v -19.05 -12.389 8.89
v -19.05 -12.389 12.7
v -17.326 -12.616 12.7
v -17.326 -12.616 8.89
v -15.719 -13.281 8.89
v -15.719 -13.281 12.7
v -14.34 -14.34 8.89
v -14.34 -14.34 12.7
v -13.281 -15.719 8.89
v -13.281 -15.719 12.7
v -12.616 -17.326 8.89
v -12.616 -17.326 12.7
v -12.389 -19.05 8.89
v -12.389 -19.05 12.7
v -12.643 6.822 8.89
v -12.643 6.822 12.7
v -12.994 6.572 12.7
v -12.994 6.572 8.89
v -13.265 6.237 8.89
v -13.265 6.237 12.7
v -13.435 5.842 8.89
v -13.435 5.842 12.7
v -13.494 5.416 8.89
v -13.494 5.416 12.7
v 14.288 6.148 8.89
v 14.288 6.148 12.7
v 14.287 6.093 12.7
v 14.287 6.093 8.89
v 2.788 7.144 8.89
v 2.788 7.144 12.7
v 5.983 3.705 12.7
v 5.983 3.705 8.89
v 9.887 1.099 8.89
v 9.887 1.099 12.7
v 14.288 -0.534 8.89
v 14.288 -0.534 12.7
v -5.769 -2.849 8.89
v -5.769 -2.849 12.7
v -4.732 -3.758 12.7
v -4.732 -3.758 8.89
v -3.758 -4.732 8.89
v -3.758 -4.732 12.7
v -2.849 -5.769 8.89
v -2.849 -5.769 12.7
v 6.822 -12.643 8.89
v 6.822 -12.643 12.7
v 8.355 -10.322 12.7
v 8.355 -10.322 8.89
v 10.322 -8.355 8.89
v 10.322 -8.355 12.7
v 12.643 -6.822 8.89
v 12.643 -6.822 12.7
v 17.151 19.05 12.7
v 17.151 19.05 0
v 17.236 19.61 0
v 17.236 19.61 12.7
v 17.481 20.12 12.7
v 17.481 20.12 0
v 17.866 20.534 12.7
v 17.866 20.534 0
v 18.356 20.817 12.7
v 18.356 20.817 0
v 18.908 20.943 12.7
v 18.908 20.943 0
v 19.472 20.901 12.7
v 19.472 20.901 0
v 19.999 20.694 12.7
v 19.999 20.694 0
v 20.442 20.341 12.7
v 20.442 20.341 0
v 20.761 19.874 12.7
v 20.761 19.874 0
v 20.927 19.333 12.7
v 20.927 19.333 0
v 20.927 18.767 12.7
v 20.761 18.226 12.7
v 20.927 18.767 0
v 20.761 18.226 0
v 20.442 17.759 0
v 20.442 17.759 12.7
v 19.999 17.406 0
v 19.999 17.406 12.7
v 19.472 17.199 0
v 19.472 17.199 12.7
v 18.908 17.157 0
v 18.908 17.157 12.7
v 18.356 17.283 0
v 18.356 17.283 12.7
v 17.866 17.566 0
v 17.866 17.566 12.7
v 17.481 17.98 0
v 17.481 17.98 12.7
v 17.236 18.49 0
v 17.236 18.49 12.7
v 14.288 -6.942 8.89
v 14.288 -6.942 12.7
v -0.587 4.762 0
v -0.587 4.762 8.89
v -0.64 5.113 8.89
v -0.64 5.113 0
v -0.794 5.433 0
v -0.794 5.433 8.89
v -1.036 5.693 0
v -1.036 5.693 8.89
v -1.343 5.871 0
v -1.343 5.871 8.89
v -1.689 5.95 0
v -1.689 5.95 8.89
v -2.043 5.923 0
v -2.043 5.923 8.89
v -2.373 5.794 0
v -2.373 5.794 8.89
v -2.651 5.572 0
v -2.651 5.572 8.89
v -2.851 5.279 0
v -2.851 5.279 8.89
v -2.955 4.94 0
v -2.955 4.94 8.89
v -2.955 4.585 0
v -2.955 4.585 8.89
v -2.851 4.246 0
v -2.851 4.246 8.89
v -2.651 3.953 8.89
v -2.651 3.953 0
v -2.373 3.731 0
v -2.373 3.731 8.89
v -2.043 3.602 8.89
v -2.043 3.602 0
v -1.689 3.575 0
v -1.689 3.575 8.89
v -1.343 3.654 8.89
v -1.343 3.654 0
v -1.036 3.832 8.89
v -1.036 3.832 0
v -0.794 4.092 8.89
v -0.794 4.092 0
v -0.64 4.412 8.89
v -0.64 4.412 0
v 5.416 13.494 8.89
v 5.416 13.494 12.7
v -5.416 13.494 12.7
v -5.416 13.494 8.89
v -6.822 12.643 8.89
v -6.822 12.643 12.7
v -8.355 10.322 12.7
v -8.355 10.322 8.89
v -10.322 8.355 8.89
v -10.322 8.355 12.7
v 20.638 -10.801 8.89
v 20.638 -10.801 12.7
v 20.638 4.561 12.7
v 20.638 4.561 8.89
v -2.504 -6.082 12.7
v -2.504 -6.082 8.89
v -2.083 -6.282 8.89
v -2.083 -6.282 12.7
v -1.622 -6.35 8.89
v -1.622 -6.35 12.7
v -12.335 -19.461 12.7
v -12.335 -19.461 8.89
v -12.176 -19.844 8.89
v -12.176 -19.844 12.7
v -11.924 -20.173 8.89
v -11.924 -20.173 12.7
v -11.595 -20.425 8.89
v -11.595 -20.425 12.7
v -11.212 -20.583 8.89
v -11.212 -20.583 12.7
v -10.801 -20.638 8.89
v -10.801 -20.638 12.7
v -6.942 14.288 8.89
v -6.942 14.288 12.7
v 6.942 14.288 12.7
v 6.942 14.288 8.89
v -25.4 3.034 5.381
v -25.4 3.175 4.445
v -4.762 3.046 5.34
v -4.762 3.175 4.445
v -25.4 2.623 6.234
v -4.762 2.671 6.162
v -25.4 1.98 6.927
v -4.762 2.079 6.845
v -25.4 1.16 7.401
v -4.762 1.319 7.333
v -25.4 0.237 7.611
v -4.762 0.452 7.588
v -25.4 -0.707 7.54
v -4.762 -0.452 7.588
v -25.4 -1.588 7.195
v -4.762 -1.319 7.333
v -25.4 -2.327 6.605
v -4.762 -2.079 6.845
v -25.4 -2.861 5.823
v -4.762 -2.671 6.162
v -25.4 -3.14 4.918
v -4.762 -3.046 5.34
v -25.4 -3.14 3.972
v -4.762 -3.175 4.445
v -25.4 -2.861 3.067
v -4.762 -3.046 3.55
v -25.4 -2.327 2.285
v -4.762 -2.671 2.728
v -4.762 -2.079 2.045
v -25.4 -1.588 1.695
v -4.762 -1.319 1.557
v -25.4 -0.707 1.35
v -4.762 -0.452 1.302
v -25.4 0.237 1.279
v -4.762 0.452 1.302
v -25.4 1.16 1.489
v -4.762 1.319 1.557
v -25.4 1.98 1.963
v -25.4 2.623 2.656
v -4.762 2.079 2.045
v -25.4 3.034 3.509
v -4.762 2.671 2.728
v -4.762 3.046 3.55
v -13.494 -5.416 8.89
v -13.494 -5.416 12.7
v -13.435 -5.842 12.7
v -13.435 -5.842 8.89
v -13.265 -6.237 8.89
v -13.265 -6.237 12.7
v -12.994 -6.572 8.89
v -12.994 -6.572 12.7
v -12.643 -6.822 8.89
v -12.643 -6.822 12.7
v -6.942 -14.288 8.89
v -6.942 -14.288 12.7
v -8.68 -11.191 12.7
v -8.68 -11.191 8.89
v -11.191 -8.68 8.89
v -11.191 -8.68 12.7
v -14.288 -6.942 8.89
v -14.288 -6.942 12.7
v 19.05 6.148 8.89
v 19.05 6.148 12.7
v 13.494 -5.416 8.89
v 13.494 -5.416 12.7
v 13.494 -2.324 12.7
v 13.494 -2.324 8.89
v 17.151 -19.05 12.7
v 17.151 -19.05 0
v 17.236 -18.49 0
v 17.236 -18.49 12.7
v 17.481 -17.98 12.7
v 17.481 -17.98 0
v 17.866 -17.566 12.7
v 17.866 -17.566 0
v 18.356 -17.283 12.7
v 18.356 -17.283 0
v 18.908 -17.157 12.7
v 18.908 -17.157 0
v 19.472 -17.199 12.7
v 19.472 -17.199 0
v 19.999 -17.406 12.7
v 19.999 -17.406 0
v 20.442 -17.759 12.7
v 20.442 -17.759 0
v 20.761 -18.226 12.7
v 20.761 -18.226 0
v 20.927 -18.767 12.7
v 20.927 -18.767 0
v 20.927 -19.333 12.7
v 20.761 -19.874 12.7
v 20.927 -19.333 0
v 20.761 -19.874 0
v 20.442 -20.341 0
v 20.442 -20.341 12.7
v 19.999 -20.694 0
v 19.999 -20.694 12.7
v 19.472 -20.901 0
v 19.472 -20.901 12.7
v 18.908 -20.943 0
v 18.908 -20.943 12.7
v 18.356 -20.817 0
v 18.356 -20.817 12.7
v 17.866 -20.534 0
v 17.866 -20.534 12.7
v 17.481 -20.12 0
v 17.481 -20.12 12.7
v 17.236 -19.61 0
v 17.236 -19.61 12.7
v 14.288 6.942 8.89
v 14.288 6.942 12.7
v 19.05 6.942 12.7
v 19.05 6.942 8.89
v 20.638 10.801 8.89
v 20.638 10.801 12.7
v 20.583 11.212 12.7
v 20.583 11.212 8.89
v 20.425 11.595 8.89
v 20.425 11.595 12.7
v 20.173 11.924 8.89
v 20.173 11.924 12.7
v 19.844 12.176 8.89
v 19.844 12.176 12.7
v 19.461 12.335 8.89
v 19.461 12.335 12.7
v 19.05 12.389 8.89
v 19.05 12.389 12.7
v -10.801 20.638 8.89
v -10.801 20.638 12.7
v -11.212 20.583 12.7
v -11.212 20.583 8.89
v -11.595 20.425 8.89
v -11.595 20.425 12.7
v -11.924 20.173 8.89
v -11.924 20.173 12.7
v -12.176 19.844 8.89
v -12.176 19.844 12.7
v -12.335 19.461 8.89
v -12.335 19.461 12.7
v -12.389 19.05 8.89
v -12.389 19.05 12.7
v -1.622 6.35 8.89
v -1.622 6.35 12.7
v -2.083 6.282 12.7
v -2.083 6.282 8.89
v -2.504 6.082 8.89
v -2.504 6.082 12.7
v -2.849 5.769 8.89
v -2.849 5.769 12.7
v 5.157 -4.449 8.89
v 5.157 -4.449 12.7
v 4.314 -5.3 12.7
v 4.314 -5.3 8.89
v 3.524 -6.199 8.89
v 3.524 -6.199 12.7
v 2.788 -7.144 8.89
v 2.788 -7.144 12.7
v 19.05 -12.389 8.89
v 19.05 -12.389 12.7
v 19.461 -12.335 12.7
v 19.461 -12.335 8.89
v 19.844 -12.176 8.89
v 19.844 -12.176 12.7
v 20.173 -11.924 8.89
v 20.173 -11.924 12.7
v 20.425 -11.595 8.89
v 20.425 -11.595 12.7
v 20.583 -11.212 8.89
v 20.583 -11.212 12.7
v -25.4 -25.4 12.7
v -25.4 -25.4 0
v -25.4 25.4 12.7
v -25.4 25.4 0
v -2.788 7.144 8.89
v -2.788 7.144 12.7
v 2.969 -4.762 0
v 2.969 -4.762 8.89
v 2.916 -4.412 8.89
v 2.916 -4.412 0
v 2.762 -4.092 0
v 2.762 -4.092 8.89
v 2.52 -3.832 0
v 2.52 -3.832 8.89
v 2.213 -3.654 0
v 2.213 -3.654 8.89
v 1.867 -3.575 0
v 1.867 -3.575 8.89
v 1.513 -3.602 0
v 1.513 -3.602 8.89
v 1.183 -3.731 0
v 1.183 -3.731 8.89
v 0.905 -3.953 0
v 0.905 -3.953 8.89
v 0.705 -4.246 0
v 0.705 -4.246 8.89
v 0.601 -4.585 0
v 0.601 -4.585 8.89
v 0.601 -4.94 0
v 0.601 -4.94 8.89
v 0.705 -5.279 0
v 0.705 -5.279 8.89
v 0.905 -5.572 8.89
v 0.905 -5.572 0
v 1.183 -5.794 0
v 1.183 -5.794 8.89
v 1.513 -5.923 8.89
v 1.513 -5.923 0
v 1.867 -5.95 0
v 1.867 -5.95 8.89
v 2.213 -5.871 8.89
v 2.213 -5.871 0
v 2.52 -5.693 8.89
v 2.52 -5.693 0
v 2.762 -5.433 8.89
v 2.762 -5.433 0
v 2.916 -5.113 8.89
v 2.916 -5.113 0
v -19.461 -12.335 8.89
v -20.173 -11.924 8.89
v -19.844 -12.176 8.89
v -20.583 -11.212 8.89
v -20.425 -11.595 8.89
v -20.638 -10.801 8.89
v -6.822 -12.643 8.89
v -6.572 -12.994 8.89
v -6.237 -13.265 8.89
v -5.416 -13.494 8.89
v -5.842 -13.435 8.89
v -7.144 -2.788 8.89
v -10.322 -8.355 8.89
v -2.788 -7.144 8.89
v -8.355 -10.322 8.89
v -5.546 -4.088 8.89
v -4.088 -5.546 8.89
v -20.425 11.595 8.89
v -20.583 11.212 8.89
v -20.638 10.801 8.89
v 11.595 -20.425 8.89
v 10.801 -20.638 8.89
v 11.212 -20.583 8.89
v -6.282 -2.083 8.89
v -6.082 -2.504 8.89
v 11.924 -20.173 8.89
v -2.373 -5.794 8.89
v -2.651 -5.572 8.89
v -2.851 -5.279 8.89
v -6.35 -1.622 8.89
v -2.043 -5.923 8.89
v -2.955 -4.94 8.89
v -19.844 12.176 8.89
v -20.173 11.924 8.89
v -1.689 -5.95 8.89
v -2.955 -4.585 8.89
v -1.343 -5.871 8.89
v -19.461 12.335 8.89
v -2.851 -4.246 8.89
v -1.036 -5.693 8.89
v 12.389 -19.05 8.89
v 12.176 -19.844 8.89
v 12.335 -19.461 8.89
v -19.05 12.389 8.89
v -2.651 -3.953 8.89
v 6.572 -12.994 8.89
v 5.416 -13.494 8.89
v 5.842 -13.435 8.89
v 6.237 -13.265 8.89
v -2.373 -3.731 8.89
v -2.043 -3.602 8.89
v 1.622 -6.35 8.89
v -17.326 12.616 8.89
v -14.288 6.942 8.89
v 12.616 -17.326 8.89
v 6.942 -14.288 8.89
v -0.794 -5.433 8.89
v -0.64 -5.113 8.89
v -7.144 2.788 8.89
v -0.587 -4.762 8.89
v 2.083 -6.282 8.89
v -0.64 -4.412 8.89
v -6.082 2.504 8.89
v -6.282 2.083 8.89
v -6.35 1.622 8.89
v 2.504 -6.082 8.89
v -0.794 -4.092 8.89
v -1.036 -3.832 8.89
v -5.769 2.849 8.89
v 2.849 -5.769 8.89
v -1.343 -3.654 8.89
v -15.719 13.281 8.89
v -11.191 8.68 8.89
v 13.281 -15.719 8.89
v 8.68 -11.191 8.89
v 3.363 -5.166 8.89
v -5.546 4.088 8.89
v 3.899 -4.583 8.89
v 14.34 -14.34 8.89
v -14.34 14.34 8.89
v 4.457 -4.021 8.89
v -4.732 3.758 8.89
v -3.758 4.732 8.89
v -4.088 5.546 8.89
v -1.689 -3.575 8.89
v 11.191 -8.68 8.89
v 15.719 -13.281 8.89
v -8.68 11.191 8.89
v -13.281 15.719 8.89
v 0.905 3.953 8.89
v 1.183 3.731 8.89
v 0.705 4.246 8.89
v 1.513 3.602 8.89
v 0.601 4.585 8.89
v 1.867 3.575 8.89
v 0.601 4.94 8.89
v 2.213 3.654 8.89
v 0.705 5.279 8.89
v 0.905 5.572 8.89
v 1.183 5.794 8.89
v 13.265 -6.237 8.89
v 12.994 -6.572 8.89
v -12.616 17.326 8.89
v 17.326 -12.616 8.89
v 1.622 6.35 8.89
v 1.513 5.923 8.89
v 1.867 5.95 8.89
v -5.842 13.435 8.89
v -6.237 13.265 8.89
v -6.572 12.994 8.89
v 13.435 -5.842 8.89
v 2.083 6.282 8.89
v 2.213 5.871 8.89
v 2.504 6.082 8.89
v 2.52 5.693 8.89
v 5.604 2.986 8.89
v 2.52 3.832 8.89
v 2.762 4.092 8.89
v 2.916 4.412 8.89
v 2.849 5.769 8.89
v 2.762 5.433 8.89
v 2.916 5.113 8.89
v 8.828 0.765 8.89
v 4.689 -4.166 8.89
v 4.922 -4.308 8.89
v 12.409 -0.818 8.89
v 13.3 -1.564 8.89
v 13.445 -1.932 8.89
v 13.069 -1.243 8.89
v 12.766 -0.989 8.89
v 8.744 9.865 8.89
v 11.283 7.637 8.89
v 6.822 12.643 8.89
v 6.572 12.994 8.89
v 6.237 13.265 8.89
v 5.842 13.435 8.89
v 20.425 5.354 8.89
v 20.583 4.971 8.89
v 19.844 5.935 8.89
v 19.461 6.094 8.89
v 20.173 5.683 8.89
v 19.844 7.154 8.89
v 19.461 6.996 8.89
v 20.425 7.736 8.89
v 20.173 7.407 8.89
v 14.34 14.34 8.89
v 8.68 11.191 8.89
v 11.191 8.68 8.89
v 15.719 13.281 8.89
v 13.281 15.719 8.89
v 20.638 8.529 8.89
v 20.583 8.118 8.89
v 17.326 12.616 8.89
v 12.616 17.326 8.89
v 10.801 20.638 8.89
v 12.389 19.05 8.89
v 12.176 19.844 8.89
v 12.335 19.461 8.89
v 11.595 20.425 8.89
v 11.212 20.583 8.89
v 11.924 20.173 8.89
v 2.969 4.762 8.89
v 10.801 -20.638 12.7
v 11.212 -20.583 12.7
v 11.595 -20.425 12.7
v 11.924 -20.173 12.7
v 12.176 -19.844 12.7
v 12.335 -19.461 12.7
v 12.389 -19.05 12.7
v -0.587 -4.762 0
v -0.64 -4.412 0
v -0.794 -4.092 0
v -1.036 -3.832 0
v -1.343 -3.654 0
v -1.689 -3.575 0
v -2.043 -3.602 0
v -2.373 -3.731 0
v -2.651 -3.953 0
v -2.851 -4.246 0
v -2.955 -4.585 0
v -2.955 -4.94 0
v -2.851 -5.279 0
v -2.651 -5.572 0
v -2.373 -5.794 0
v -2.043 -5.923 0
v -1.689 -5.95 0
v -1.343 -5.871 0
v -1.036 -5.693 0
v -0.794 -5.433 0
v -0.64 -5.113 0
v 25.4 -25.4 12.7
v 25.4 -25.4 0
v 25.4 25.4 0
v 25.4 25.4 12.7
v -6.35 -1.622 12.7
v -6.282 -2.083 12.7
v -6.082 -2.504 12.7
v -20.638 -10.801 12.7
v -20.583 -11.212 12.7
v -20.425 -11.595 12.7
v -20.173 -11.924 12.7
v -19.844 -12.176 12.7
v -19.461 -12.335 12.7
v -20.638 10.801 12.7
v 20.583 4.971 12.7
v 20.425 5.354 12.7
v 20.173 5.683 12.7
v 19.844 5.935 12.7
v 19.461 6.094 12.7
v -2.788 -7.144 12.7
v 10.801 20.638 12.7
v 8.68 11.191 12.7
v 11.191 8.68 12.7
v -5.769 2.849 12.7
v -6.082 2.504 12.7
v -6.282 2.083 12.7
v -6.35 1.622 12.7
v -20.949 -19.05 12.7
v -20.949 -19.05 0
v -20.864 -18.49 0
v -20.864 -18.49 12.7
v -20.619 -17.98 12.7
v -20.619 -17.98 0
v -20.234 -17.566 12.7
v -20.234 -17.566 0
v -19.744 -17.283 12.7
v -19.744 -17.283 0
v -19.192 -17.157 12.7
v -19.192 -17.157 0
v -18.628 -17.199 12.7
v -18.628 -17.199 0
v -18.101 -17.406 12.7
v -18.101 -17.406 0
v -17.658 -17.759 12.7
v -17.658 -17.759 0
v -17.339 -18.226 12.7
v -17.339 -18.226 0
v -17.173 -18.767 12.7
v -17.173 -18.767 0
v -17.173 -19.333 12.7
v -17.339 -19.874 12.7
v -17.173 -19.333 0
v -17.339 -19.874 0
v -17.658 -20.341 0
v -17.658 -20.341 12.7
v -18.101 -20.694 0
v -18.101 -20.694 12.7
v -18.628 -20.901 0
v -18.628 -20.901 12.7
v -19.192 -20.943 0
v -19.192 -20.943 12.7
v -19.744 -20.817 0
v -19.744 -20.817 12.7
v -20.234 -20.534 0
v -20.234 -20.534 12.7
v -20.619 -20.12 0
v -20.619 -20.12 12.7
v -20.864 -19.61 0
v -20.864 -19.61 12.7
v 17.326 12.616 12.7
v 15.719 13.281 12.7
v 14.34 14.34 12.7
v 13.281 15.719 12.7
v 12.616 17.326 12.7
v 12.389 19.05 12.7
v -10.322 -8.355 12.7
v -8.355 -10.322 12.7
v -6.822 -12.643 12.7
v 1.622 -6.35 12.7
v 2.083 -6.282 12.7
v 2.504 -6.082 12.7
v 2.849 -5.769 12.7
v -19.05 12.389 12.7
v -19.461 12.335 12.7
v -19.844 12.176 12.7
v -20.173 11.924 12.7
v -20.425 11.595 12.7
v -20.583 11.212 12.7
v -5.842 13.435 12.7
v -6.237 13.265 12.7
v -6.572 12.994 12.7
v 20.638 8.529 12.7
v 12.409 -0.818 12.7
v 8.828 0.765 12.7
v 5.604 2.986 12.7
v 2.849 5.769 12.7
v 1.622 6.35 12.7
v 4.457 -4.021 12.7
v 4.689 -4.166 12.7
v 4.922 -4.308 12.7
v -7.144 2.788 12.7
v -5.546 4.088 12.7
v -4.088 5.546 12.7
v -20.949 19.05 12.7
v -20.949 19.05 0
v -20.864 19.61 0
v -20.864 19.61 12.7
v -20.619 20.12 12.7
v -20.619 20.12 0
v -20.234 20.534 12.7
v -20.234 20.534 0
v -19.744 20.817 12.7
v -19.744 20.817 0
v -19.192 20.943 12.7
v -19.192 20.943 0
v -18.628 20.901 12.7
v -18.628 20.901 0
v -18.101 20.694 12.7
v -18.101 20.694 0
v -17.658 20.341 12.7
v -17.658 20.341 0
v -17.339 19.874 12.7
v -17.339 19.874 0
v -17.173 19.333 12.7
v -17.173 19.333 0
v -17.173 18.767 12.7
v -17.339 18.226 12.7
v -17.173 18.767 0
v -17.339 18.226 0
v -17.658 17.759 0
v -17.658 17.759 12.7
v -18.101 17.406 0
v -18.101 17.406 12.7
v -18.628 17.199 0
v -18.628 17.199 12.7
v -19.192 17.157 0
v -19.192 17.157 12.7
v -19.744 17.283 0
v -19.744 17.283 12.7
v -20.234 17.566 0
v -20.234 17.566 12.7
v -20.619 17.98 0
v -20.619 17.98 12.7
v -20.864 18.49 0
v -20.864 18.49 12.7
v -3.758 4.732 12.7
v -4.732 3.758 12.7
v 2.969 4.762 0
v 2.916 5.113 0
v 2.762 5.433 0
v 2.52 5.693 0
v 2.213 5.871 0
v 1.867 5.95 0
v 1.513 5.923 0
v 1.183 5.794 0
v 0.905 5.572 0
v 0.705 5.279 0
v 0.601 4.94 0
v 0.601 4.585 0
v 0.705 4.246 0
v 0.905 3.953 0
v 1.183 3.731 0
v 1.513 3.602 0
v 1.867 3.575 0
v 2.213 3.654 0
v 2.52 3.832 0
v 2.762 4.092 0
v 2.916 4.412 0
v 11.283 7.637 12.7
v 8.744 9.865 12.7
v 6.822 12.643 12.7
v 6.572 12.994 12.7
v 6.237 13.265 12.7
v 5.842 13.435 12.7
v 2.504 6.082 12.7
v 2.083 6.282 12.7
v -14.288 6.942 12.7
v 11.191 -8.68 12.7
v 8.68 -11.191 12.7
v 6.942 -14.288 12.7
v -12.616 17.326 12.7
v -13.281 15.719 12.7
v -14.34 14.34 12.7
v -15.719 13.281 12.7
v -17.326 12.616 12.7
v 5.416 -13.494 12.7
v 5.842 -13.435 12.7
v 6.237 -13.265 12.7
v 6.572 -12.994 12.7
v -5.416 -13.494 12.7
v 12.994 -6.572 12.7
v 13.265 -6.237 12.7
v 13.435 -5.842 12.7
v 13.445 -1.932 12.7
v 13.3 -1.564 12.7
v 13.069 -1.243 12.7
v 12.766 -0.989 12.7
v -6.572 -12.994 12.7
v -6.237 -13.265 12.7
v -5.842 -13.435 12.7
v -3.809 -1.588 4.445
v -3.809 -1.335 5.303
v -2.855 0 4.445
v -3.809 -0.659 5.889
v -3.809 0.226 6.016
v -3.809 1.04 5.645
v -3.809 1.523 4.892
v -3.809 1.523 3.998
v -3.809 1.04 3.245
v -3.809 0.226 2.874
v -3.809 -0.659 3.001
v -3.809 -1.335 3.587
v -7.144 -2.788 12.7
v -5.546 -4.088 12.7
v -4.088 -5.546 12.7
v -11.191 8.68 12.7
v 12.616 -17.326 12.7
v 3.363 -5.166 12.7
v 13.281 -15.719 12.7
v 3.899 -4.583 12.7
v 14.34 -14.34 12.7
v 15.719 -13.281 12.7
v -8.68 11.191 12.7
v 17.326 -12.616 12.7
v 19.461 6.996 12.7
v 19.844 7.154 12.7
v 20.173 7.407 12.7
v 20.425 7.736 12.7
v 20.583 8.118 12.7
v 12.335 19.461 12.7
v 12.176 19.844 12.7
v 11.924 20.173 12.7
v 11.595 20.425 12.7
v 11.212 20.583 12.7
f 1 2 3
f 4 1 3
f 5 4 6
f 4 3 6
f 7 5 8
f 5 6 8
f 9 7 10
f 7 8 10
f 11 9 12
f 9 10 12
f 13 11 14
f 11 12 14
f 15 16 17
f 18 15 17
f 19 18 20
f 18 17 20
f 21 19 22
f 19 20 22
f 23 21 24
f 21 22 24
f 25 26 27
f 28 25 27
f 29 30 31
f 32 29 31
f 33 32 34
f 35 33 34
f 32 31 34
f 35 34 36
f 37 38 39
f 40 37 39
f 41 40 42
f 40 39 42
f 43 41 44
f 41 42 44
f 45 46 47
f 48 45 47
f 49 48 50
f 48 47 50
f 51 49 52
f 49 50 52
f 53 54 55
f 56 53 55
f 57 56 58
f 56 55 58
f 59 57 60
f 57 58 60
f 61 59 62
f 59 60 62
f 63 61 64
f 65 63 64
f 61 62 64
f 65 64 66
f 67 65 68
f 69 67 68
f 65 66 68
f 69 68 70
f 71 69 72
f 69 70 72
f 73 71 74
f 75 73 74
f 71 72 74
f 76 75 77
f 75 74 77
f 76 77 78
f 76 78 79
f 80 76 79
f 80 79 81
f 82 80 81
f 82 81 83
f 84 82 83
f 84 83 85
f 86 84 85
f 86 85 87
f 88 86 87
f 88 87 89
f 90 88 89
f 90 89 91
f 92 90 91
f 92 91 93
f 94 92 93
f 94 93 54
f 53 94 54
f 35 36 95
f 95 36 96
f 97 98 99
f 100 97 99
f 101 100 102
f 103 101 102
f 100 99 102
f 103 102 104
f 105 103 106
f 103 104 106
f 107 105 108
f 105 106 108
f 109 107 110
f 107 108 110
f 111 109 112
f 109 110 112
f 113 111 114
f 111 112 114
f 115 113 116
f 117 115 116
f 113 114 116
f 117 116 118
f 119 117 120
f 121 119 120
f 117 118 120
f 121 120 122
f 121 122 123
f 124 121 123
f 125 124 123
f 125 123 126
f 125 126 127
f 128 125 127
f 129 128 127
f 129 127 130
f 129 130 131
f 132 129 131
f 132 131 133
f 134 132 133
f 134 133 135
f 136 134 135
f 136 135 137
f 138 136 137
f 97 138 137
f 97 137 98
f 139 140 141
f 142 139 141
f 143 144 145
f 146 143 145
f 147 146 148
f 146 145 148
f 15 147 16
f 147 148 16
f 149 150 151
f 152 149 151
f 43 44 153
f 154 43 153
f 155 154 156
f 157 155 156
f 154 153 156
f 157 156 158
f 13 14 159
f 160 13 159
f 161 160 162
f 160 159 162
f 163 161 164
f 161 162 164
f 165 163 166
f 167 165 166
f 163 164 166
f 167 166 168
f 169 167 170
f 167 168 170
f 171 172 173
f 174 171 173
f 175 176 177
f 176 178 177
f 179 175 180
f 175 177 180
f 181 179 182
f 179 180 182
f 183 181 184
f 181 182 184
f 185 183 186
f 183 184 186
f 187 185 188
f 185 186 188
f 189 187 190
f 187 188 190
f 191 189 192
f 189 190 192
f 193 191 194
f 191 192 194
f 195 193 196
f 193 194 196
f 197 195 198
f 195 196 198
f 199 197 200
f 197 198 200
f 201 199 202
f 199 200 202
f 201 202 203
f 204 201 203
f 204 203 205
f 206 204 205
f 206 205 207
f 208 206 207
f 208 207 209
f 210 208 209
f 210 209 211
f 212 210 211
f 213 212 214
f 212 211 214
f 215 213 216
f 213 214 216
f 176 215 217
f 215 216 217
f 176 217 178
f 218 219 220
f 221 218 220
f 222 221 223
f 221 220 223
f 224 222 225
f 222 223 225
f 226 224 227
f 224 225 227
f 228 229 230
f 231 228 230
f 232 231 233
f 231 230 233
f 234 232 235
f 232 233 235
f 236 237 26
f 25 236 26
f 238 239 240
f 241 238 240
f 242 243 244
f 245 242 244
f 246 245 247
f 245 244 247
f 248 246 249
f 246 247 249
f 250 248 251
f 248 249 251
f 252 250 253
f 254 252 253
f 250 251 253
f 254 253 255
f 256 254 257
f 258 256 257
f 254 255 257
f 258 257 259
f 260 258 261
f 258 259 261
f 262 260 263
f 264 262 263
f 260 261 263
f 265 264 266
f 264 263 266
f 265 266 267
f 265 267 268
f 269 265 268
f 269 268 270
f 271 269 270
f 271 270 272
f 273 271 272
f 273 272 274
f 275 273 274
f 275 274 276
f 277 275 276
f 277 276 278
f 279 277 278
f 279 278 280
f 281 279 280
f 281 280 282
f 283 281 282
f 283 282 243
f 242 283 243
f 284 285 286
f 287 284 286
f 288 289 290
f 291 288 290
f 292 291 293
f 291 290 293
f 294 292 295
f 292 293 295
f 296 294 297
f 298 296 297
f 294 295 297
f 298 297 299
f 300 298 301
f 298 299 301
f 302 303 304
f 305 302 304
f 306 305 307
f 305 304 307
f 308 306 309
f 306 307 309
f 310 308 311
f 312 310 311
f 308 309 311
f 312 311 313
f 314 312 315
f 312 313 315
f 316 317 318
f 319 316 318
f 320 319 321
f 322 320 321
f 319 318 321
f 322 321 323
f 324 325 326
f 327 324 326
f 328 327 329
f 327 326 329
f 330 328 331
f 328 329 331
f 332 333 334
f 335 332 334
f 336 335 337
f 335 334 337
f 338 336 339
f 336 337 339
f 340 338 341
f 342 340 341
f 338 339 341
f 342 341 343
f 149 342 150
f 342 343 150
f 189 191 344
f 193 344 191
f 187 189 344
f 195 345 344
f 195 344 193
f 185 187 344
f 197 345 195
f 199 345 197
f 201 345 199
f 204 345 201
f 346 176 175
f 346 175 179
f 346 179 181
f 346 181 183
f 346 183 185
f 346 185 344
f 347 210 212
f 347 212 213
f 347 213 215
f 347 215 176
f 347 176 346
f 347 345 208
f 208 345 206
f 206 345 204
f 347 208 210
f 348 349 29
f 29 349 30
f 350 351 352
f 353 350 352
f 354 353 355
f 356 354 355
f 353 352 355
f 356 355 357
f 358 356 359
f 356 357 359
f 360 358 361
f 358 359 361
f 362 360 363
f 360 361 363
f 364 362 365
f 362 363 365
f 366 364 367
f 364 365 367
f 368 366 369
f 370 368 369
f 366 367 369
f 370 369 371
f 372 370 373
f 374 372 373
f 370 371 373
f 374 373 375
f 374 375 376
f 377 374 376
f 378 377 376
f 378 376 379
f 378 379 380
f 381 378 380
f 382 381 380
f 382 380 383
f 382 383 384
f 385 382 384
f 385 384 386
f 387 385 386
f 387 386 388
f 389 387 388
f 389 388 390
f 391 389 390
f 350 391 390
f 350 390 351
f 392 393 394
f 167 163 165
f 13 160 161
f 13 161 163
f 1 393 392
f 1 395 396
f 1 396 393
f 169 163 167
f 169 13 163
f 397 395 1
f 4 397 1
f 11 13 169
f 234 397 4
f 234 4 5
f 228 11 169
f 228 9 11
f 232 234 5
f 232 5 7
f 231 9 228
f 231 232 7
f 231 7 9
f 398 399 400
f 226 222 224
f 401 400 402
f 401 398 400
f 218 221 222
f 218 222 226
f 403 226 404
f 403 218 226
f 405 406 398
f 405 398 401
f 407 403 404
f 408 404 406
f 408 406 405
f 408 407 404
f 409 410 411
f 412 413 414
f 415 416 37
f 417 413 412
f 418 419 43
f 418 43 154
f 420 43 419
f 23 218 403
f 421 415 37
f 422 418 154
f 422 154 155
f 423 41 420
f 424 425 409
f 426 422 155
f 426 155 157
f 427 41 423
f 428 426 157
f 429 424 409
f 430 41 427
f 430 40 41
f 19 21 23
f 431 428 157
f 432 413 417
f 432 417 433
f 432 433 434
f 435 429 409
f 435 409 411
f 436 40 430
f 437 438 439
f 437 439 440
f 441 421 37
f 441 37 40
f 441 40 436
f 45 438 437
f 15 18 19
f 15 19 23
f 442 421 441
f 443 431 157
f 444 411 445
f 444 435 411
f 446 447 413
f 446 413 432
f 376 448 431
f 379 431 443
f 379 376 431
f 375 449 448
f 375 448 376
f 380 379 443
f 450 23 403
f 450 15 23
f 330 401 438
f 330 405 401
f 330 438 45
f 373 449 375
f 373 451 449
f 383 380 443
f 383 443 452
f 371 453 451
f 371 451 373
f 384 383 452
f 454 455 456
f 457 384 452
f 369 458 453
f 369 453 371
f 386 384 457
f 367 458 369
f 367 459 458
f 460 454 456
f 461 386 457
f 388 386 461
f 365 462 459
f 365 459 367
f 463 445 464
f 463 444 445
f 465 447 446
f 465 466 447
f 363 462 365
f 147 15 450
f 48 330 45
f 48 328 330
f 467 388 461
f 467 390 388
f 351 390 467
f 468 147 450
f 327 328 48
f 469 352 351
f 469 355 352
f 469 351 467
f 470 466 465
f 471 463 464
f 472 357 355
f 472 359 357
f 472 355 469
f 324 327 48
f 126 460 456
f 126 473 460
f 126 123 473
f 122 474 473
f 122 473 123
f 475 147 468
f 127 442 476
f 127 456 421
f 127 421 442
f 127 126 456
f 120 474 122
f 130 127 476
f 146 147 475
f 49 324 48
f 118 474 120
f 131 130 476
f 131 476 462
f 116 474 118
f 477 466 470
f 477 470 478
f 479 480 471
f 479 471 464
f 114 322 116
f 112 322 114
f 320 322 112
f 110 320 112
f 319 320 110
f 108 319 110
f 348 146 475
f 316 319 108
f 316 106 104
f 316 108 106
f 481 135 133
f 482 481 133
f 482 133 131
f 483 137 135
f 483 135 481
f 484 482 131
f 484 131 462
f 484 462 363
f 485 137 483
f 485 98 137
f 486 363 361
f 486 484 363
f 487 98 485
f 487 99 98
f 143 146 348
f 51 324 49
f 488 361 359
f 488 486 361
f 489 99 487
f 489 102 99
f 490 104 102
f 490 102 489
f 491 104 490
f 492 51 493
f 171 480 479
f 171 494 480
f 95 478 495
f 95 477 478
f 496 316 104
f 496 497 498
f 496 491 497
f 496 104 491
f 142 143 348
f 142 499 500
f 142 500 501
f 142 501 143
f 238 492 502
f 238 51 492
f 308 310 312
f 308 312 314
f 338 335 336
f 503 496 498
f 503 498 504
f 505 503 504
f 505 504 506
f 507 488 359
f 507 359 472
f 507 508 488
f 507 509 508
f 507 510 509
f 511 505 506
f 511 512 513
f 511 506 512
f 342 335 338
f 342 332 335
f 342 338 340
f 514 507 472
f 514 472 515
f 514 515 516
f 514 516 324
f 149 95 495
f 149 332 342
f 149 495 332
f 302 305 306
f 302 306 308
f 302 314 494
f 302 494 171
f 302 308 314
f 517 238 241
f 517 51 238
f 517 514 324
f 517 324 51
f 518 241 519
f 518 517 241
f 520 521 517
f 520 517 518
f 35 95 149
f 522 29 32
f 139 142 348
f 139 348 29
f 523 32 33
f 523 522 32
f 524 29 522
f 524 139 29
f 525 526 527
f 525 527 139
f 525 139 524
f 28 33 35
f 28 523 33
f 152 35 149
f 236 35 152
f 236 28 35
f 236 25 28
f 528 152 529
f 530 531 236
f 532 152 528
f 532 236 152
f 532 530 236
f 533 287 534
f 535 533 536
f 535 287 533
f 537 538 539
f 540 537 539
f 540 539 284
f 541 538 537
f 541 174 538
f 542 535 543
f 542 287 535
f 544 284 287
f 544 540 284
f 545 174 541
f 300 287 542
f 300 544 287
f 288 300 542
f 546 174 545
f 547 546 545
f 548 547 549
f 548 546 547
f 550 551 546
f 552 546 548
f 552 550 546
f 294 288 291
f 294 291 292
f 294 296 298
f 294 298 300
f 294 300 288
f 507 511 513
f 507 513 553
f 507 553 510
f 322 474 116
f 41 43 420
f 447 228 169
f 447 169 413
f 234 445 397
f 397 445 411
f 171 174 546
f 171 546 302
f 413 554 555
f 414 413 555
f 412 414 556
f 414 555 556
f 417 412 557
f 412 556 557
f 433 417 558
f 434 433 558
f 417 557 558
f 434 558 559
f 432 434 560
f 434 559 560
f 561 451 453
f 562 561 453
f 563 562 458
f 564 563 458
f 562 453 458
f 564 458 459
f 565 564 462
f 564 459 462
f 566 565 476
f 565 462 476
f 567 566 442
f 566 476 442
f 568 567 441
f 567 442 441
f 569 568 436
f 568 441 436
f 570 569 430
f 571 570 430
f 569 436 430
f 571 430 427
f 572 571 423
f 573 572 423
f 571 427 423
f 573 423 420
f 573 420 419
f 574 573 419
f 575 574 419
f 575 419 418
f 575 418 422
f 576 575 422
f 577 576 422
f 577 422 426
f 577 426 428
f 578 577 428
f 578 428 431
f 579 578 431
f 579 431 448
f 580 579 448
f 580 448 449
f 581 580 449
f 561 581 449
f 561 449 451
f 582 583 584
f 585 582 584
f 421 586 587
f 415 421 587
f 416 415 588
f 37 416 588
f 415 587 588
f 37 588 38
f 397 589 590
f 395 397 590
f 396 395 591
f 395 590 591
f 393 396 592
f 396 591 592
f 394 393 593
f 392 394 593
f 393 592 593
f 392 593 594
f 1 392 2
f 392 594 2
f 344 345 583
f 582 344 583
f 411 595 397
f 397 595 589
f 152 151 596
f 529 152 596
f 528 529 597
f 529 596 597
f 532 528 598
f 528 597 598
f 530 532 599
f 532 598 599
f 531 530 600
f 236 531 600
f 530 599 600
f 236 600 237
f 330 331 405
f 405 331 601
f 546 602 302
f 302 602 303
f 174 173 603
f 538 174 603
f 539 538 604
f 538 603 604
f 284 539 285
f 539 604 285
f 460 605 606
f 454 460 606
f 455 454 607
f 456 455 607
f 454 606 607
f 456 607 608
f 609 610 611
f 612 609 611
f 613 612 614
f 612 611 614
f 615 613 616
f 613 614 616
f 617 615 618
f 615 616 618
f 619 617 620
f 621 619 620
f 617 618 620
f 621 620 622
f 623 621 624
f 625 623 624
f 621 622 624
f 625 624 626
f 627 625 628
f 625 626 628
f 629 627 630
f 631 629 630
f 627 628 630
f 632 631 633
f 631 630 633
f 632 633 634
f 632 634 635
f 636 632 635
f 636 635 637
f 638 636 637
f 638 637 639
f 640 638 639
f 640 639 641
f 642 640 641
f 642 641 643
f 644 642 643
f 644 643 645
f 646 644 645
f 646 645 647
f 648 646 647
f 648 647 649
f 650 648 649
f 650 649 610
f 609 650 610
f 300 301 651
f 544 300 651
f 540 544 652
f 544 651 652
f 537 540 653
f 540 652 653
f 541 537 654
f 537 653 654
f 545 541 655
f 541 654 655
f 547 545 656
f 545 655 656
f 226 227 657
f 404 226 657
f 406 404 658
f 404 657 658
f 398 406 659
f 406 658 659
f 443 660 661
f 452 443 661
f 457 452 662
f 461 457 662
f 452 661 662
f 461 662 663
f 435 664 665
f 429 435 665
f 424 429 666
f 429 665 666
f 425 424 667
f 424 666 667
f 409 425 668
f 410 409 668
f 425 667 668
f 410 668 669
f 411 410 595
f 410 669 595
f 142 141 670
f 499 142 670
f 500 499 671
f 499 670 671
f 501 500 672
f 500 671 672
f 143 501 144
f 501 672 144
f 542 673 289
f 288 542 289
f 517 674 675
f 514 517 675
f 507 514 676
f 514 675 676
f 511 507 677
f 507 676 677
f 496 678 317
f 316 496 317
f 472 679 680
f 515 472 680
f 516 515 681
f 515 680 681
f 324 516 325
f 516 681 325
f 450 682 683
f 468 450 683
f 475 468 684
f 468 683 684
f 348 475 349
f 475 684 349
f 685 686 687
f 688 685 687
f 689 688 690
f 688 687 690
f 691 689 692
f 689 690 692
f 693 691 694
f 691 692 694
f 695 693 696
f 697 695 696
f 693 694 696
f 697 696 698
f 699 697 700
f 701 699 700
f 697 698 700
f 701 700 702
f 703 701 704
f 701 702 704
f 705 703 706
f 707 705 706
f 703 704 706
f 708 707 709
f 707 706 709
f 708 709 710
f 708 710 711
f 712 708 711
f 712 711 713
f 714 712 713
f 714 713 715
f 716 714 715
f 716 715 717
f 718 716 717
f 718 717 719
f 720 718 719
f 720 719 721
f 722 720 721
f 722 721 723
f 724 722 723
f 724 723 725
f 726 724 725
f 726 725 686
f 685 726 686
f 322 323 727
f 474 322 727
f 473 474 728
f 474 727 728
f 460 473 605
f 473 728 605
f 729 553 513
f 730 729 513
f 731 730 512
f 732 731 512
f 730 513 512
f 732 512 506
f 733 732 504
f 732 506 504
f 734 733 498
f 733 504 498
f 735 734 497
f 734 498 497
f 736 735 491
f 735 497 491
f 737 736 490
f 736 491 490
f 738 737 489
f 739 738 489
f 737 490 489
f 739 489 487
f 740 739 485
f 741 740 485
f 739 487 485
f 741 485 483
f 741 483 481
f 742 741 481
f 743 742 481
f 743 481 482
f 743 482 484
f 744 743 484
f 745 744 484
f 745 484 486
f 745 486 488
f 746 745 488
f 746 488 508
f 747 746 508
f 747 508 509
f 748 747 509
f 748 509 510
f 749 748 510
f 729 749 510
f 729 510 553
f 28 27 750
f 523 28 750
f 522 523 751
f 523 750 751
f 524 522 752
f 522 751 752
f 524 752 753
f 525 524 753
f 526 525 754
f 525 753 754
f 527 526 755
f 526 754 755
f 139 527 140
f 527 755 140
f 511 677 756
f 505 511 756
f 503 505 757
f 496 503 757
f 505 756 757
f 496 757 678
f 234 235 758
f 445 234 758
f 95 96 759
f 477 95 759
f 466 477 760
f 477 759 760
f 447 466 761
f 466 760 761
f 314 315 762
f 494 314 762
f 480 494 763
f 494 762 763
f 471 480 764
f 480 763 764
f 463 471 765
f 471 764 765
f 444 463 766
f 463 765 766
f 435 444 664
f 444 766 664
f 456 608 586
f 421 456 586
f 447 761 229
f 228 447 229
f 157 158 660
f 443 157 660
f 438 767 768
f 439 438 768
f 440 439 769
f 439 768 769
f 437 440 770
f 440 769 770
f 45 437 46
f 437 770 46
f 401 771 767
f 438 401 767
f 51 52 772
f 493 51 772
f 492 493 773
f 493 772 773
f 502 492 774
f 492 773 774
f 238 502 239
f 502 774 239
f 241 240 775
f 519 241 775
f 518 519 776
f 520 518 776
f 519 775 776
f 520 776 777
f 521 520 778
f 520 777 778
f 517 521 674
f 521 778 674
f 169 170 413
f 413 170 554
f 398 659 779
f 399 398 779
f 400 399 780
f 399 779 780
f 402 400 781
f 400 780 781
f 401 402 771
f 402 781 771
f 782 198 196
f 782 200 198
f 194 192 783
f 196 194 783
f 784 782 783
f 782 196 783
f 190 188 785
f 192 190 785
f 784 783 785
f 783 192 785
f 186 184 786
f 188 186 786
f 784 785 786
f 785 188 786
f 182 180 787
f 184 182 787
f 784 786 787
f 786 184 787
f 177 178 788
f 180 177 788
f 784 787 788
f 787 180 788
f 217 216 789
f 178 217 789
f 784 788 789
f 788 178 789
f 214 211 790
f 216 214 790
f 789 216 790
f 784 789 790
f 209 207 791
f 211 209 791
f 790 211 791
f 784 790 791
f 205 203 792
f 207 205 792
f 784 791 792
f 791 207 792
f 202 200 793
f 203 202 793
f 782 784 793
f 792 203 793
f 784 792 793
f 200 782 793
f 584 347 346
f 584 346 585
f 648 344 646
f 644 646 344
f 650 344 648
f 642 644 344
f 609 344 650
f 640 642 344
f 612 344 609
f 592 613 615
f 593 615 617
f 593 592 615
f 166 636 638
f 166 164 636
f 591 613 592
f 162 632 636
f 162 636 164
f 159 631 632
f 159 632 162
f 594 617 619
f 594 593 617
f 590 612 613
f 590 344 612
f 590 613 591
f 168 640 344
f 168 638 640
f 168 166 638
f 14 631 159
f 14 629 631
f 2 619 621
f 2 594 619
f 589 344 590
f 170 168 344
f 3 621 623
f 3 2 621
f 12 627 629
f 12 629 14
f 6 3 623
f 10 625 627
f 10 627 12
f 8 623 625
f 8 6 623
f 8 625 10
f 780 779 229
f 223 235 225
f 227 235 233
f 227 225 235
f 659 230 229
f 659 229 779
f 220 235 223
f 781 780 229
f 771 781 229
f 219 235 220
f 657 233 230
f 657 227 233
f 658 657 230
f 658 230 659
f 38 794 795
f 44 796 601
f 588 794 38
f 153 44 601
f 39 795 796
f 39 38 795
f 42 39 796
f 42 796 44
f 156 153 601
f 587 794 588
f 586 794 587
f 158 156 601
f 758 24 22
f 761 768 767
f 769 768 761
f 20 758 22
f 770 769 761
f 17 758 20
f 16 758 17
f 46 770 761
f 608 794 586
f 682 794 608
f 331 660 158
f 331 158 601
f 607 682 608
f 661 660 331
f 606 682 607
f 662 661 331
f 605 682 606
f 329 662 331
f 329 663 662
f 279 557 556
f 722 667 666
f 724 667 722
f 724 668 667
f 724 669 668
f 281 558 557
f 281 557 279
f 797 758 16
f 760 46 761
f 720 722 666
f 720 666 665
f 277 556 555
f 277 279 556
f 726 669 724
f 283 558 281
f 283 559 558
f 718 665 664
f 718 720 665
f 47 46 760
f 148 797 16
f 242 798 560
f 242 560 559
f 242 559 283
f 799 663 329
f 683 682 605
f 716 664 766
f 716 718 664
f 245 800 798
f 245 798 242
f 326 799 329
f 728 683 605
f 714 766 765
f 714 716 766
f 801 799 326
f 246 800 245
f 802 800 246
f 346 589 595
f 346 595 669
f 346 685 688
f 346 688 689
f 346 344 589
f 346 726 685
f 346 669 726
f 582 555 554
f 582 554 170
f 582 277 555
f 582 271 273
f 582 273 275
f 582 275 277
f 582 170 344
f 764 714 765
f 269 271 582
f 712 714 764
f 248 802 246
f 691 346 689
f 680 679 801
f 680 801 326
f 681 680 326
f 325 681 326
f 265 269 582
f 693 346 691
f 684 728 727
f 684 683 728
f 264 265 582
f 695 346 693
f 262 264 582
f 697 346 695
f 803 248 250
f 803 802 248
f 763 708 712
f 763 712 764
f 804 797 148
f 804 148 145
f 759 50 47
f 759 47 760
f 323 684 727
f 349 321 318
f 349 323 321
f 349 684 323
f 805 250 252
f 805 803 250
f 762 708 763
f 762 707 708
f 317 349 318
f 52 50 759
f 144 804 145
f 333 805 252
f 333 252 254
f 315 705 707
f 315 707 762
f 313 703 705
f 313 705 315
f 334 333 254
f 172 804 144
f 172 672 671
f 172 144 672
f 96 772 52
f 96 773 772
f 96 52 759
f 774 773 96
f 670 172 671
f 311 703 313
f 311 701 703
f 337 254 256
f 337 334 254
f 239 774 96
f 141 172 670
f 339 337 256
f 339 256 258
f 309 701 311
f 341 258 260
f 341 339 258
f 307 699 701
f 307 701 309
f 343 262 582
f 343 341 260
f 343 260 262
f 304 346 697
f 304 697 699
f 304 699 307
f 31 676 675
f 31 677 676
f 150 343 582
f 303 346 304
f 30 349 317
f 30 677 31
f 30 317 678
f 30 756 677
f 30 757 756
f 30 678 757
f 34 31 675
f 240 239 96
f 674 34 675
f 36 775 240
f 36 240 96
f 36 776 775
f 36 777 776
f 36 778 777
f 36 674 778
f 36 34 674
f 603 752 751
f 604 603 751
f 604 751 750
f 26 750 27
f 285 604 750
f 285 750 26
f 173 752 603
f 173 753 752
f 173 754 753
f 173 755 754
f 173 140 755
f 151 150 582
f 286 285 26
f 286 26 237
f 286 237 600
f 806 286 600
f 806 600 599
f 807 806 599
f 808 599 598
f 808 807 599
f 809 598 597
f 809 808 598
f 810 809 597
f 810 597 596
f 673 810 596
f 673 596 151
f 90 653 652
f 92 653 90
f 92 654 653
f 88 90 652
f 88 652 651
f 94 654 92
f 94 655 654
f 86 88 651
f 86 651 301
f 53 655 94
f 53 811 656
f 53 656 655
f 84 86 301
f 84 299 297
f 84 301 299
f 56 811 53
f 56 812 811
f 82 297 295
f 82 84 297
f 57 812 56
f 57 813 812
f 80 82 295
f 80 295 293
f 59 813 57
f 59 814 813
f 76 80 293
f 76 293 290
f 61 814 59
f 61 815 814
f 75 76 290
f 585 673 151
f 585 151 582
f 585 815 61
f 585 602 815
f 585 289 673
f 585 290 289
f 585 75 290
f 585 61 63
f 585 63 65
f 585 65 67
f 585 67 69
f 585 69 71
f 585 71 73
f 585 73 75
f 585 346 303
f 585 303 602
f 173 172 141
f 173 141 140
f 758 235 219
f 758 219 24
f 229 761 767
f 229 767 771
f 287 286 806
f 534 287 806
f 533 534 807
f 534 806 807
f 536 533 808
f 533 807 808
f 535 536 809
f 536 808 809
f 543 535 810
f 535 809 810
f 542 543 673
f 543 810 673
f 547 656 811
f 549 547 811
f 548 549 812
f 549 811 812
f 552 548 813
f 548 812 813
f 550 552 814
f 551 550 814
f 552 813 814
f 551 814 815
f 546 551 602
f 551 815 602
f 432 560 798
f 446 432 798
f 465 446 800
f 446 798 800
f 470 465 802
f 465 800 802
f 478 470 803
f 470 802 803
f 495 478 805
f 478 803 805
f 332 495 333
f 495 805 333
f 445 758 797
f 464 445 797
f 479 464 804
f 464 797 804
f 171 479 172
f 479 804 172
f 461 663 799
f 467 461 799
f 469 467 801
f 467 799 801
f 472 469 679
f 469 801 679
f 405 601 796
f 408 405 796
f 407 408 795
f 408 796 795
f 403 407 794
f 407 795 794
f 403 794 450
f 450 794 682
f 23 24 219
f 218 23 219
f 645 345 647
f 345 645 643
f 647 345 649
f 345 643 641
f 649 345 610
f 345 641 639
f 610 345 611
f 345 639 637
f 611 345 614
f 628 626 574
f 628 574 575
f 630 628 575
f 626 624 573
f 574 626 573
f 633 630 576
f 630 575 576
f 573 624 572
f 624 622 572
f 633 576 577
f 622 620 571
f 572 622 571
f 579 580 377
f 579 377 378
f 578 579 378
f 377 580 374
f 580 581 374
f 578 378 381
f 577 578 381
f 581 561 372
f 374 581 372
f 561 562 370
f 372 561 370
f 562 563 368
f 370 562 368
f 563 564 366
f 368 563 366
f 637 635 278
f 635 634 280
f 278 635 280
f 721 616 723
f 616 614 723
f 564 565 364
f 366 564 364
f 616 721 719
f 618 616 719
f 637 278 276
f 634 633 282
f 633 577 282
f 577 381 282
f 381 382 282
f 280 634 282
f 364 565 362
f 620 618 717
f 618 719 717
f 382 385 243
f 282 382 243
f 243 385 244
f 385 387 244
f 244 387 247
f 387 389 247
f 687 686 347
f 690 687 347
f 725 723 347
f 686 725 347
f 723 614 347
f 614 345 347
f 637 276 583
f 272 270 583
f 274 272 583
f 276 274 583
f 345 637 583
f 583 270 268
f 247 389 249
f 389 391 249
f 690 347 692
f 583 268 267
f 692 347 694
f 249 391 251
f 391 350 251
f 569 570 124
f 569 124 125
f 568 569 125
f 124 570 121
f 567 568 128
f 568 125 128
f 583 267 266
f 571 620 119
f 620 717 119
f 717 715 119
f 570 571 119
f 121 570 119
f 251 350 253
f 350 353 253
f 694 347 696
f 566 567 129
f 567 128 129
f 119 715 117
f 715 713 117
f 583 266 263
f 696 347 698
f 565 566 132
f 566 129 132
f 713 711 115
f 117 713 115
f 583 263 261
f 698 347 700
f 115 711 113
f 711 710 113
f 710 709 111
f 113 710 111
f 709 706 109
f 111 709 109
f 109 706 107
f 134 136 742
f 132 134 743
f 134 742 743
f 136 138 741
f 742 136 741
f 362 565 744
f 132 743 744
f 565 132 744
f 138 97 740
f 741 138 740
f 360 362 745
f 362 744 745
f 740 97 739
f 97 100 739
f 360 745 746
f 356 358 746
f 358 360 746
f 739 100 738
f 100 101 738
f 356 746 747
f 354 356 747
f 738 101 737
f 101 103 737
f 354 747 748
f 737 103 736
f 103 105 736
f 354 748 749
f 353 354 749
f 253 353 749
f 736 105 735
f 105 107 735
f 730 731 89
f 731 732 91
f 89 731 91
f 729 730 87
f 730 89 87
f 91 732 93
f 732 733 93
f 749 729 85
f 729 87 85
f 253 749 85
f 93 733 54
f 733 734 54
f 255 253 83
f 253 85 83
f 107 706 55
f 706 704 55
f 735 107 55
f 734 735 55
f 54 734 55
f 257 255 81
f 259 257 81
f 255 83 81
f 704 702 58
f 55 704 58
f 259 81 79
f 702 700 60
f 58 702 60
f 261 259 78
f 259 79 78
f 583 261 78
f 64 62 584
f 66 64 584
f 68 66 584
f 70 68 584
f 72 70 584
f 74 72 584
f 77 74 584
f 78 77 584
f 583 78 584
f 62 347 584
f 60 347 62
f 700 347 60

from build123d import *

# Parameters (mm, degrees)
F0_W      = 50.8
F0_H      = 50.8
F1_DEPTH  = 12.7
F5_D      = 6.35
F5_DEPTH  = 20.6375
F5_TIP    = 1.9077324654
F7_D      = 3.7973
F8_R      = 1.190625
F9_DEPTH  = 3.81
F10_R     = 1.190625
F11_DEPTH = 12.701


with BuildPart() as f1:
    # F0 (on Top) → F1 (new body)
    with BuildSketch(Plane.XY):
        Rectangle(F0_W, F0_H)
    extrude(amount=F1_DEPTH)

    # F5
    with Locations(Plane(origin=(-25.4, 0, 0), x_dir=(0, -1, 0), z_dir=(-1, 0, 0))):
        with Locations((0, 4.445)):
            Hole(F5_D / 2, depth=F5_DEPTH)
            with Locations((0, 0, -(F5_DEPTH + F5_TIP / 2))):  # 118° drill point
                Cone(0, F5_D / 2, F5_TIP, mode=Mode.SUBTRACT)

    # F7 (through all)
    with Locations(Plane.XY.offset(12.7)):
        with Locations((-19.05, 19.05), (19.05, 19.05), (19.05, -19.05), (-19.05, -19.05)):
            Hole(F7_D / 2)

    # F8 (on face) → F9 (cut)
    with BuildSketch(Plane.XY.offset(12.7)):
        with BuildLine():
            Line((20.6375, 8.5292954232), (20.6375, 10.80135))
            ThreePointArc((20.6375, 10.80135), (20.1725320151, 11.9238820151), (19.05, 12.38885))
            ThreePointArc((19.05, 12.38885), (14.3398556645, 14.3398556645), (12.38885, 19.05))
            ThreePointArc((12.38885, 19.05), (11.9238820151, 20.1725320151), (10.80135, 20.6375))
            Line((10.80135, 20.6375), (-10.80135, 20.6375))
            ThreePointArc((-10.80135, 20.6375), (-11.9238820151, 20.1725320151), (-12.38885, 19.05))
            ThreePointArc((-12.38885, 19.05), (-14.3398556645, 14.3398556645), (-19.05, 12.38885))
            ThreePointArc((-19.05, 12.38885), (-20.1725320151, 11.9238820151), (-20.6375, 10.80135))
            Line((-20.6375, 10.80135), (-20.6375, -10.80135))
            ThreePointArc((-20.6375, -10.80135), (-20.1725320151, -11.9238820151), (-19.05, -12.38885))
            ThreePointArc((-19.05, -12.38885), (-14.3398556645, -14.3398556645), (-12.38885, -19.05))
            ThreePointArc((-12.38885, -19.05), (-11.9238820151, -20.1725320151), (-10.80135, -20.6375))
            Line((-10.80135, -20.6375), (10.80135, -20.6375))
            ThreePointArc((10.80135, -20.6375), (11.9238820151, -20.1725320151), (12.38885, -19.05))
            ThreePointArc((12.38885, -19.05), (14.3398556645, -14.3398556645), (19.05, -12.38885))
            ThreePointArc((19.05, -12.38885), (20.1725320151, -11.9238820151), (20.6375, -10.80135))
            Line((20.6375, -10.80135), (20.6375, 4.5605454232))
            ThreePointArc((20.6375, 4.5605454232), (20.1725320151, 5.6830774384), (19.05, 6.1480454232))
            Line((19.05, 6.1480454232), (14.2875, 6.1480454232))
            Line((14.2875, 6.1480454232), (14.2875, 6.0926137759))
            ThreePointArc((14.2875, 6.0926137759), (9.9452262, 8.6731816985), (6.821921312, 12.643022896))
            ThreePointArc((6.821921312, 12.643022896), (6.2374933843, 13.2645178717), (5.4157485098, 13.49375))
            Line((5.4157485098, 13.49375), (-5.4157485098, 13.49375))
            ThreePointArc((-5.4157485098, 13.49375), (-6.2374933843, 13.2645178717), (-6.821921312, 12.643022896))
            ThreePointArc((-6.821921312, 12.643022896), (-9.2884615964, 9.2884615964), (-12.643022896, 6.821921312))
            ThreePointArc((-12.643022896, 6.821921312), (-13.2645178717, 6.2374933843), (-13.49375, 5.4157485098))
            Line((-13.49375, 5.4157485098), (-13.49375, -5.4157485098))
            ThreePointArc((-13.49375, -5.4157485098), (-13.2645178717, -6.2374933843), (-12.643022896, -6.821921312))
            ThreePointArc((-12.643022896, -6.821921312), (-9.2884615964, -9.2884615964), (-6.821921312, -12.643022896))
            ThreePointArc((-6.821921312, -12.643022896), (-6.2374933843, -13.2645178717), (-5.4157485098, -13.49375))
            Line((-5.4157485098, -13.49375), (5.4157485098, -13.49375))
            ThreePointArc((5.4157485098, -13.49375), (6.2374933843, -13.2645178717), (6.821921312, -12.643022896))
            ThreePointArc((6.821921312, -12.643022896), (9.2884615964, -9.2884615964), (12.643022896, -6.821921312))
            ThreePointArc((12.643022896, -6.821921312), (13.2645178717, -6.2374933843), (13.49375, -5.4157485098))
            Line((13.49375, -5.4157485098), (13.49375, -2.3239302132))
            ThreePointArc((13.49375, -2.3239302132), (13.1944701574, -1.3962206272), (12.4094727388, -0.8182997389))
            ThreePointArc((12.4094727388, -0.8182997389), (7.1639891354, 1.7998207966), (2.8493973076, 5.7689454776))
            ThreePointArc((2.8493973076, 5.7689454776), (2.3008328233, 6.1974021649), (1.6217068945, 6.35))
            Line((1.6217068945, 6.35), (-1.6217068945, 6.35))
            ThreePointArc((-1.6217068945, 6.35), (-2.3008328233, 6.1974021649), (-2.8493973076, 5.7689454776))
            ThreePointArc((-2.8493973076, 5.7689454776), (-4.2370675283, 4.2370675283), (-5.7689454776, 2.8493973076))
            ThreePointArc((-5.7689454776, 2.8493973076), (-6.1974021649, 2.3008328233), (-6.35, 1.6217068945))
            Line((-6.35, 1.6217068945), (-6.35, -1.6217068945))
            ThreePointArc((-6.35, -1.6217068945), (-6.1974021649, -2.3008328233), (-5.7689454776, -2.8493973076))
            ThreePointArc((-5.7689454776, -2.8493973076), (-4.2370675283, -4.2370675283), (-2.8493973076, -5.7689454776))
            ThreePointArc((-2.8493973076, -5.7689454776), (-2.3008328233, -6.1974021649), (-1.6217068945, -6.35))
            Line((-1.6217068945, -6.35), (1.6217068945, -6.35))
            ThreePointArc((1.6217068945, -6.35), (2.3008328233, -6.1974021649), (2.8493973076, -5.7689454776))
            ThreePointArc((2.8493973076, -5.7689454776), (3.6282714753, -4.8719808812), (4.4567370697, -4.0206083333))
            ThreePointArc((4.4567370697, -4.0206083333), (4.8051043626, -4.2373192983), (5.1566891771, -4.4487703125))
            ThreePointArc((5.1566891771, -4.4487703125), (3.9121206801, -5.7434375699), (2.7877367827, -7.14375))
            Line((2.7877367827, -7.14375), (-2.7877367827, -7.14375))
            ThreePointArc((-2.7877367827, -7.14375), (-4.7983335359, -4.7983335359), (-7.14375, -2.7877367827))
            Line((-7.14375, -2.7877367827), (-7.14375, 2.7877367827))
            ThreePointArc((-7.14375, 2.7877367827), (-4.7983335359, 4.7983335359), (-2.7877367827, 7.14375))
            Line((-2.7877367827, 7.14375), (2.7877367827, 7.14375))
            ThreePointArc((2.7877367827, 7.14375), (7.858589431, 2.2877709273), (14.2875, -0.5341412311))
            Line((14.2875, -0.5341412311), (14.2875, -6.9417954232))
            ThreePointArc((14.2875, -6.9417954232), (9.849727604, -9.849727604), (6.9417954232, -14.2875))
            Line((6.9417954232, -14.2875), (-6.9417954232, -14.2875))
            ThreePointArc((-6.9417954232, -14.2875), (-9.849727604, -9.849727604), (-14.2875, -6.9417954232))
            Line((-14.2875, -6.9417954232), (-14.2875, 6.9417954232))
            ThreePointArc((-14.2875, 6.9417954232), (-9.849727604, 9.849727604), (-6.9417954232, 14.2875))
            Line((-6.9417954232, 14.2875), (6.9417954232, 14.2875))
            ThreePointArc((6.9417954232, 14.2875), (9.849727604, 9.849727604), (14.2875, 6.9417954232))
            Line((14.2875, 6.9417954232), (19.05, 6.9417954232))
            ThreePointArc((19.05, 6.9417954232), (20.1725320151, 7.4067634081), (20.6375, 8.5292954232))
        make_face()
        with Locations((-1.778, -4.7625)):
            Circle(F8_R, mode=Mode.SUBTRACT)
        with Locations((1.778, -4.7625)):
            Circle(F8_R, mode=Mode.SUBTRACT)
        with Locations((-1.778, 4.7625)):
            Circle(F8_R, mode=Mode.SUBTRACT)
        with Locations((1.778, 4.7625)):
            Circle(F8_R, mode=Mode.SUBTRACT)
        with Locations((-1.778, 4.7625)):
            Circle(F8_R)
        with Locations((1.778, 4.7625)):
            Circle(F8_R)
        with Locations((1.778, -4.7625)):
            Circle(F8_R)
        with Locations((-1.778, -4.7625)):
            Circle(F8_R)
    extrude(amount=-F9_DEPTH, mode=Mode.SUBTRACT)

    # F10 (on face) → F11 (cut, through all)
    with BuildSketch(Plane.XY.offset(12.7)):
        with Locations((-1.778, 4.7625)):
            Circle(F10_R)
        with Locations((1.778, 4.7625)):
            Circle(F10_R)
        with Locations((1.778, -4.7625)):
            Circle(F10_R)
        with Locations((-1.778, -4.7625)):
            Circle(F10_R)
    extrude(amount=-F11_DEPTH, mode=Mode.SUBTRACT)


solid = f1.part
